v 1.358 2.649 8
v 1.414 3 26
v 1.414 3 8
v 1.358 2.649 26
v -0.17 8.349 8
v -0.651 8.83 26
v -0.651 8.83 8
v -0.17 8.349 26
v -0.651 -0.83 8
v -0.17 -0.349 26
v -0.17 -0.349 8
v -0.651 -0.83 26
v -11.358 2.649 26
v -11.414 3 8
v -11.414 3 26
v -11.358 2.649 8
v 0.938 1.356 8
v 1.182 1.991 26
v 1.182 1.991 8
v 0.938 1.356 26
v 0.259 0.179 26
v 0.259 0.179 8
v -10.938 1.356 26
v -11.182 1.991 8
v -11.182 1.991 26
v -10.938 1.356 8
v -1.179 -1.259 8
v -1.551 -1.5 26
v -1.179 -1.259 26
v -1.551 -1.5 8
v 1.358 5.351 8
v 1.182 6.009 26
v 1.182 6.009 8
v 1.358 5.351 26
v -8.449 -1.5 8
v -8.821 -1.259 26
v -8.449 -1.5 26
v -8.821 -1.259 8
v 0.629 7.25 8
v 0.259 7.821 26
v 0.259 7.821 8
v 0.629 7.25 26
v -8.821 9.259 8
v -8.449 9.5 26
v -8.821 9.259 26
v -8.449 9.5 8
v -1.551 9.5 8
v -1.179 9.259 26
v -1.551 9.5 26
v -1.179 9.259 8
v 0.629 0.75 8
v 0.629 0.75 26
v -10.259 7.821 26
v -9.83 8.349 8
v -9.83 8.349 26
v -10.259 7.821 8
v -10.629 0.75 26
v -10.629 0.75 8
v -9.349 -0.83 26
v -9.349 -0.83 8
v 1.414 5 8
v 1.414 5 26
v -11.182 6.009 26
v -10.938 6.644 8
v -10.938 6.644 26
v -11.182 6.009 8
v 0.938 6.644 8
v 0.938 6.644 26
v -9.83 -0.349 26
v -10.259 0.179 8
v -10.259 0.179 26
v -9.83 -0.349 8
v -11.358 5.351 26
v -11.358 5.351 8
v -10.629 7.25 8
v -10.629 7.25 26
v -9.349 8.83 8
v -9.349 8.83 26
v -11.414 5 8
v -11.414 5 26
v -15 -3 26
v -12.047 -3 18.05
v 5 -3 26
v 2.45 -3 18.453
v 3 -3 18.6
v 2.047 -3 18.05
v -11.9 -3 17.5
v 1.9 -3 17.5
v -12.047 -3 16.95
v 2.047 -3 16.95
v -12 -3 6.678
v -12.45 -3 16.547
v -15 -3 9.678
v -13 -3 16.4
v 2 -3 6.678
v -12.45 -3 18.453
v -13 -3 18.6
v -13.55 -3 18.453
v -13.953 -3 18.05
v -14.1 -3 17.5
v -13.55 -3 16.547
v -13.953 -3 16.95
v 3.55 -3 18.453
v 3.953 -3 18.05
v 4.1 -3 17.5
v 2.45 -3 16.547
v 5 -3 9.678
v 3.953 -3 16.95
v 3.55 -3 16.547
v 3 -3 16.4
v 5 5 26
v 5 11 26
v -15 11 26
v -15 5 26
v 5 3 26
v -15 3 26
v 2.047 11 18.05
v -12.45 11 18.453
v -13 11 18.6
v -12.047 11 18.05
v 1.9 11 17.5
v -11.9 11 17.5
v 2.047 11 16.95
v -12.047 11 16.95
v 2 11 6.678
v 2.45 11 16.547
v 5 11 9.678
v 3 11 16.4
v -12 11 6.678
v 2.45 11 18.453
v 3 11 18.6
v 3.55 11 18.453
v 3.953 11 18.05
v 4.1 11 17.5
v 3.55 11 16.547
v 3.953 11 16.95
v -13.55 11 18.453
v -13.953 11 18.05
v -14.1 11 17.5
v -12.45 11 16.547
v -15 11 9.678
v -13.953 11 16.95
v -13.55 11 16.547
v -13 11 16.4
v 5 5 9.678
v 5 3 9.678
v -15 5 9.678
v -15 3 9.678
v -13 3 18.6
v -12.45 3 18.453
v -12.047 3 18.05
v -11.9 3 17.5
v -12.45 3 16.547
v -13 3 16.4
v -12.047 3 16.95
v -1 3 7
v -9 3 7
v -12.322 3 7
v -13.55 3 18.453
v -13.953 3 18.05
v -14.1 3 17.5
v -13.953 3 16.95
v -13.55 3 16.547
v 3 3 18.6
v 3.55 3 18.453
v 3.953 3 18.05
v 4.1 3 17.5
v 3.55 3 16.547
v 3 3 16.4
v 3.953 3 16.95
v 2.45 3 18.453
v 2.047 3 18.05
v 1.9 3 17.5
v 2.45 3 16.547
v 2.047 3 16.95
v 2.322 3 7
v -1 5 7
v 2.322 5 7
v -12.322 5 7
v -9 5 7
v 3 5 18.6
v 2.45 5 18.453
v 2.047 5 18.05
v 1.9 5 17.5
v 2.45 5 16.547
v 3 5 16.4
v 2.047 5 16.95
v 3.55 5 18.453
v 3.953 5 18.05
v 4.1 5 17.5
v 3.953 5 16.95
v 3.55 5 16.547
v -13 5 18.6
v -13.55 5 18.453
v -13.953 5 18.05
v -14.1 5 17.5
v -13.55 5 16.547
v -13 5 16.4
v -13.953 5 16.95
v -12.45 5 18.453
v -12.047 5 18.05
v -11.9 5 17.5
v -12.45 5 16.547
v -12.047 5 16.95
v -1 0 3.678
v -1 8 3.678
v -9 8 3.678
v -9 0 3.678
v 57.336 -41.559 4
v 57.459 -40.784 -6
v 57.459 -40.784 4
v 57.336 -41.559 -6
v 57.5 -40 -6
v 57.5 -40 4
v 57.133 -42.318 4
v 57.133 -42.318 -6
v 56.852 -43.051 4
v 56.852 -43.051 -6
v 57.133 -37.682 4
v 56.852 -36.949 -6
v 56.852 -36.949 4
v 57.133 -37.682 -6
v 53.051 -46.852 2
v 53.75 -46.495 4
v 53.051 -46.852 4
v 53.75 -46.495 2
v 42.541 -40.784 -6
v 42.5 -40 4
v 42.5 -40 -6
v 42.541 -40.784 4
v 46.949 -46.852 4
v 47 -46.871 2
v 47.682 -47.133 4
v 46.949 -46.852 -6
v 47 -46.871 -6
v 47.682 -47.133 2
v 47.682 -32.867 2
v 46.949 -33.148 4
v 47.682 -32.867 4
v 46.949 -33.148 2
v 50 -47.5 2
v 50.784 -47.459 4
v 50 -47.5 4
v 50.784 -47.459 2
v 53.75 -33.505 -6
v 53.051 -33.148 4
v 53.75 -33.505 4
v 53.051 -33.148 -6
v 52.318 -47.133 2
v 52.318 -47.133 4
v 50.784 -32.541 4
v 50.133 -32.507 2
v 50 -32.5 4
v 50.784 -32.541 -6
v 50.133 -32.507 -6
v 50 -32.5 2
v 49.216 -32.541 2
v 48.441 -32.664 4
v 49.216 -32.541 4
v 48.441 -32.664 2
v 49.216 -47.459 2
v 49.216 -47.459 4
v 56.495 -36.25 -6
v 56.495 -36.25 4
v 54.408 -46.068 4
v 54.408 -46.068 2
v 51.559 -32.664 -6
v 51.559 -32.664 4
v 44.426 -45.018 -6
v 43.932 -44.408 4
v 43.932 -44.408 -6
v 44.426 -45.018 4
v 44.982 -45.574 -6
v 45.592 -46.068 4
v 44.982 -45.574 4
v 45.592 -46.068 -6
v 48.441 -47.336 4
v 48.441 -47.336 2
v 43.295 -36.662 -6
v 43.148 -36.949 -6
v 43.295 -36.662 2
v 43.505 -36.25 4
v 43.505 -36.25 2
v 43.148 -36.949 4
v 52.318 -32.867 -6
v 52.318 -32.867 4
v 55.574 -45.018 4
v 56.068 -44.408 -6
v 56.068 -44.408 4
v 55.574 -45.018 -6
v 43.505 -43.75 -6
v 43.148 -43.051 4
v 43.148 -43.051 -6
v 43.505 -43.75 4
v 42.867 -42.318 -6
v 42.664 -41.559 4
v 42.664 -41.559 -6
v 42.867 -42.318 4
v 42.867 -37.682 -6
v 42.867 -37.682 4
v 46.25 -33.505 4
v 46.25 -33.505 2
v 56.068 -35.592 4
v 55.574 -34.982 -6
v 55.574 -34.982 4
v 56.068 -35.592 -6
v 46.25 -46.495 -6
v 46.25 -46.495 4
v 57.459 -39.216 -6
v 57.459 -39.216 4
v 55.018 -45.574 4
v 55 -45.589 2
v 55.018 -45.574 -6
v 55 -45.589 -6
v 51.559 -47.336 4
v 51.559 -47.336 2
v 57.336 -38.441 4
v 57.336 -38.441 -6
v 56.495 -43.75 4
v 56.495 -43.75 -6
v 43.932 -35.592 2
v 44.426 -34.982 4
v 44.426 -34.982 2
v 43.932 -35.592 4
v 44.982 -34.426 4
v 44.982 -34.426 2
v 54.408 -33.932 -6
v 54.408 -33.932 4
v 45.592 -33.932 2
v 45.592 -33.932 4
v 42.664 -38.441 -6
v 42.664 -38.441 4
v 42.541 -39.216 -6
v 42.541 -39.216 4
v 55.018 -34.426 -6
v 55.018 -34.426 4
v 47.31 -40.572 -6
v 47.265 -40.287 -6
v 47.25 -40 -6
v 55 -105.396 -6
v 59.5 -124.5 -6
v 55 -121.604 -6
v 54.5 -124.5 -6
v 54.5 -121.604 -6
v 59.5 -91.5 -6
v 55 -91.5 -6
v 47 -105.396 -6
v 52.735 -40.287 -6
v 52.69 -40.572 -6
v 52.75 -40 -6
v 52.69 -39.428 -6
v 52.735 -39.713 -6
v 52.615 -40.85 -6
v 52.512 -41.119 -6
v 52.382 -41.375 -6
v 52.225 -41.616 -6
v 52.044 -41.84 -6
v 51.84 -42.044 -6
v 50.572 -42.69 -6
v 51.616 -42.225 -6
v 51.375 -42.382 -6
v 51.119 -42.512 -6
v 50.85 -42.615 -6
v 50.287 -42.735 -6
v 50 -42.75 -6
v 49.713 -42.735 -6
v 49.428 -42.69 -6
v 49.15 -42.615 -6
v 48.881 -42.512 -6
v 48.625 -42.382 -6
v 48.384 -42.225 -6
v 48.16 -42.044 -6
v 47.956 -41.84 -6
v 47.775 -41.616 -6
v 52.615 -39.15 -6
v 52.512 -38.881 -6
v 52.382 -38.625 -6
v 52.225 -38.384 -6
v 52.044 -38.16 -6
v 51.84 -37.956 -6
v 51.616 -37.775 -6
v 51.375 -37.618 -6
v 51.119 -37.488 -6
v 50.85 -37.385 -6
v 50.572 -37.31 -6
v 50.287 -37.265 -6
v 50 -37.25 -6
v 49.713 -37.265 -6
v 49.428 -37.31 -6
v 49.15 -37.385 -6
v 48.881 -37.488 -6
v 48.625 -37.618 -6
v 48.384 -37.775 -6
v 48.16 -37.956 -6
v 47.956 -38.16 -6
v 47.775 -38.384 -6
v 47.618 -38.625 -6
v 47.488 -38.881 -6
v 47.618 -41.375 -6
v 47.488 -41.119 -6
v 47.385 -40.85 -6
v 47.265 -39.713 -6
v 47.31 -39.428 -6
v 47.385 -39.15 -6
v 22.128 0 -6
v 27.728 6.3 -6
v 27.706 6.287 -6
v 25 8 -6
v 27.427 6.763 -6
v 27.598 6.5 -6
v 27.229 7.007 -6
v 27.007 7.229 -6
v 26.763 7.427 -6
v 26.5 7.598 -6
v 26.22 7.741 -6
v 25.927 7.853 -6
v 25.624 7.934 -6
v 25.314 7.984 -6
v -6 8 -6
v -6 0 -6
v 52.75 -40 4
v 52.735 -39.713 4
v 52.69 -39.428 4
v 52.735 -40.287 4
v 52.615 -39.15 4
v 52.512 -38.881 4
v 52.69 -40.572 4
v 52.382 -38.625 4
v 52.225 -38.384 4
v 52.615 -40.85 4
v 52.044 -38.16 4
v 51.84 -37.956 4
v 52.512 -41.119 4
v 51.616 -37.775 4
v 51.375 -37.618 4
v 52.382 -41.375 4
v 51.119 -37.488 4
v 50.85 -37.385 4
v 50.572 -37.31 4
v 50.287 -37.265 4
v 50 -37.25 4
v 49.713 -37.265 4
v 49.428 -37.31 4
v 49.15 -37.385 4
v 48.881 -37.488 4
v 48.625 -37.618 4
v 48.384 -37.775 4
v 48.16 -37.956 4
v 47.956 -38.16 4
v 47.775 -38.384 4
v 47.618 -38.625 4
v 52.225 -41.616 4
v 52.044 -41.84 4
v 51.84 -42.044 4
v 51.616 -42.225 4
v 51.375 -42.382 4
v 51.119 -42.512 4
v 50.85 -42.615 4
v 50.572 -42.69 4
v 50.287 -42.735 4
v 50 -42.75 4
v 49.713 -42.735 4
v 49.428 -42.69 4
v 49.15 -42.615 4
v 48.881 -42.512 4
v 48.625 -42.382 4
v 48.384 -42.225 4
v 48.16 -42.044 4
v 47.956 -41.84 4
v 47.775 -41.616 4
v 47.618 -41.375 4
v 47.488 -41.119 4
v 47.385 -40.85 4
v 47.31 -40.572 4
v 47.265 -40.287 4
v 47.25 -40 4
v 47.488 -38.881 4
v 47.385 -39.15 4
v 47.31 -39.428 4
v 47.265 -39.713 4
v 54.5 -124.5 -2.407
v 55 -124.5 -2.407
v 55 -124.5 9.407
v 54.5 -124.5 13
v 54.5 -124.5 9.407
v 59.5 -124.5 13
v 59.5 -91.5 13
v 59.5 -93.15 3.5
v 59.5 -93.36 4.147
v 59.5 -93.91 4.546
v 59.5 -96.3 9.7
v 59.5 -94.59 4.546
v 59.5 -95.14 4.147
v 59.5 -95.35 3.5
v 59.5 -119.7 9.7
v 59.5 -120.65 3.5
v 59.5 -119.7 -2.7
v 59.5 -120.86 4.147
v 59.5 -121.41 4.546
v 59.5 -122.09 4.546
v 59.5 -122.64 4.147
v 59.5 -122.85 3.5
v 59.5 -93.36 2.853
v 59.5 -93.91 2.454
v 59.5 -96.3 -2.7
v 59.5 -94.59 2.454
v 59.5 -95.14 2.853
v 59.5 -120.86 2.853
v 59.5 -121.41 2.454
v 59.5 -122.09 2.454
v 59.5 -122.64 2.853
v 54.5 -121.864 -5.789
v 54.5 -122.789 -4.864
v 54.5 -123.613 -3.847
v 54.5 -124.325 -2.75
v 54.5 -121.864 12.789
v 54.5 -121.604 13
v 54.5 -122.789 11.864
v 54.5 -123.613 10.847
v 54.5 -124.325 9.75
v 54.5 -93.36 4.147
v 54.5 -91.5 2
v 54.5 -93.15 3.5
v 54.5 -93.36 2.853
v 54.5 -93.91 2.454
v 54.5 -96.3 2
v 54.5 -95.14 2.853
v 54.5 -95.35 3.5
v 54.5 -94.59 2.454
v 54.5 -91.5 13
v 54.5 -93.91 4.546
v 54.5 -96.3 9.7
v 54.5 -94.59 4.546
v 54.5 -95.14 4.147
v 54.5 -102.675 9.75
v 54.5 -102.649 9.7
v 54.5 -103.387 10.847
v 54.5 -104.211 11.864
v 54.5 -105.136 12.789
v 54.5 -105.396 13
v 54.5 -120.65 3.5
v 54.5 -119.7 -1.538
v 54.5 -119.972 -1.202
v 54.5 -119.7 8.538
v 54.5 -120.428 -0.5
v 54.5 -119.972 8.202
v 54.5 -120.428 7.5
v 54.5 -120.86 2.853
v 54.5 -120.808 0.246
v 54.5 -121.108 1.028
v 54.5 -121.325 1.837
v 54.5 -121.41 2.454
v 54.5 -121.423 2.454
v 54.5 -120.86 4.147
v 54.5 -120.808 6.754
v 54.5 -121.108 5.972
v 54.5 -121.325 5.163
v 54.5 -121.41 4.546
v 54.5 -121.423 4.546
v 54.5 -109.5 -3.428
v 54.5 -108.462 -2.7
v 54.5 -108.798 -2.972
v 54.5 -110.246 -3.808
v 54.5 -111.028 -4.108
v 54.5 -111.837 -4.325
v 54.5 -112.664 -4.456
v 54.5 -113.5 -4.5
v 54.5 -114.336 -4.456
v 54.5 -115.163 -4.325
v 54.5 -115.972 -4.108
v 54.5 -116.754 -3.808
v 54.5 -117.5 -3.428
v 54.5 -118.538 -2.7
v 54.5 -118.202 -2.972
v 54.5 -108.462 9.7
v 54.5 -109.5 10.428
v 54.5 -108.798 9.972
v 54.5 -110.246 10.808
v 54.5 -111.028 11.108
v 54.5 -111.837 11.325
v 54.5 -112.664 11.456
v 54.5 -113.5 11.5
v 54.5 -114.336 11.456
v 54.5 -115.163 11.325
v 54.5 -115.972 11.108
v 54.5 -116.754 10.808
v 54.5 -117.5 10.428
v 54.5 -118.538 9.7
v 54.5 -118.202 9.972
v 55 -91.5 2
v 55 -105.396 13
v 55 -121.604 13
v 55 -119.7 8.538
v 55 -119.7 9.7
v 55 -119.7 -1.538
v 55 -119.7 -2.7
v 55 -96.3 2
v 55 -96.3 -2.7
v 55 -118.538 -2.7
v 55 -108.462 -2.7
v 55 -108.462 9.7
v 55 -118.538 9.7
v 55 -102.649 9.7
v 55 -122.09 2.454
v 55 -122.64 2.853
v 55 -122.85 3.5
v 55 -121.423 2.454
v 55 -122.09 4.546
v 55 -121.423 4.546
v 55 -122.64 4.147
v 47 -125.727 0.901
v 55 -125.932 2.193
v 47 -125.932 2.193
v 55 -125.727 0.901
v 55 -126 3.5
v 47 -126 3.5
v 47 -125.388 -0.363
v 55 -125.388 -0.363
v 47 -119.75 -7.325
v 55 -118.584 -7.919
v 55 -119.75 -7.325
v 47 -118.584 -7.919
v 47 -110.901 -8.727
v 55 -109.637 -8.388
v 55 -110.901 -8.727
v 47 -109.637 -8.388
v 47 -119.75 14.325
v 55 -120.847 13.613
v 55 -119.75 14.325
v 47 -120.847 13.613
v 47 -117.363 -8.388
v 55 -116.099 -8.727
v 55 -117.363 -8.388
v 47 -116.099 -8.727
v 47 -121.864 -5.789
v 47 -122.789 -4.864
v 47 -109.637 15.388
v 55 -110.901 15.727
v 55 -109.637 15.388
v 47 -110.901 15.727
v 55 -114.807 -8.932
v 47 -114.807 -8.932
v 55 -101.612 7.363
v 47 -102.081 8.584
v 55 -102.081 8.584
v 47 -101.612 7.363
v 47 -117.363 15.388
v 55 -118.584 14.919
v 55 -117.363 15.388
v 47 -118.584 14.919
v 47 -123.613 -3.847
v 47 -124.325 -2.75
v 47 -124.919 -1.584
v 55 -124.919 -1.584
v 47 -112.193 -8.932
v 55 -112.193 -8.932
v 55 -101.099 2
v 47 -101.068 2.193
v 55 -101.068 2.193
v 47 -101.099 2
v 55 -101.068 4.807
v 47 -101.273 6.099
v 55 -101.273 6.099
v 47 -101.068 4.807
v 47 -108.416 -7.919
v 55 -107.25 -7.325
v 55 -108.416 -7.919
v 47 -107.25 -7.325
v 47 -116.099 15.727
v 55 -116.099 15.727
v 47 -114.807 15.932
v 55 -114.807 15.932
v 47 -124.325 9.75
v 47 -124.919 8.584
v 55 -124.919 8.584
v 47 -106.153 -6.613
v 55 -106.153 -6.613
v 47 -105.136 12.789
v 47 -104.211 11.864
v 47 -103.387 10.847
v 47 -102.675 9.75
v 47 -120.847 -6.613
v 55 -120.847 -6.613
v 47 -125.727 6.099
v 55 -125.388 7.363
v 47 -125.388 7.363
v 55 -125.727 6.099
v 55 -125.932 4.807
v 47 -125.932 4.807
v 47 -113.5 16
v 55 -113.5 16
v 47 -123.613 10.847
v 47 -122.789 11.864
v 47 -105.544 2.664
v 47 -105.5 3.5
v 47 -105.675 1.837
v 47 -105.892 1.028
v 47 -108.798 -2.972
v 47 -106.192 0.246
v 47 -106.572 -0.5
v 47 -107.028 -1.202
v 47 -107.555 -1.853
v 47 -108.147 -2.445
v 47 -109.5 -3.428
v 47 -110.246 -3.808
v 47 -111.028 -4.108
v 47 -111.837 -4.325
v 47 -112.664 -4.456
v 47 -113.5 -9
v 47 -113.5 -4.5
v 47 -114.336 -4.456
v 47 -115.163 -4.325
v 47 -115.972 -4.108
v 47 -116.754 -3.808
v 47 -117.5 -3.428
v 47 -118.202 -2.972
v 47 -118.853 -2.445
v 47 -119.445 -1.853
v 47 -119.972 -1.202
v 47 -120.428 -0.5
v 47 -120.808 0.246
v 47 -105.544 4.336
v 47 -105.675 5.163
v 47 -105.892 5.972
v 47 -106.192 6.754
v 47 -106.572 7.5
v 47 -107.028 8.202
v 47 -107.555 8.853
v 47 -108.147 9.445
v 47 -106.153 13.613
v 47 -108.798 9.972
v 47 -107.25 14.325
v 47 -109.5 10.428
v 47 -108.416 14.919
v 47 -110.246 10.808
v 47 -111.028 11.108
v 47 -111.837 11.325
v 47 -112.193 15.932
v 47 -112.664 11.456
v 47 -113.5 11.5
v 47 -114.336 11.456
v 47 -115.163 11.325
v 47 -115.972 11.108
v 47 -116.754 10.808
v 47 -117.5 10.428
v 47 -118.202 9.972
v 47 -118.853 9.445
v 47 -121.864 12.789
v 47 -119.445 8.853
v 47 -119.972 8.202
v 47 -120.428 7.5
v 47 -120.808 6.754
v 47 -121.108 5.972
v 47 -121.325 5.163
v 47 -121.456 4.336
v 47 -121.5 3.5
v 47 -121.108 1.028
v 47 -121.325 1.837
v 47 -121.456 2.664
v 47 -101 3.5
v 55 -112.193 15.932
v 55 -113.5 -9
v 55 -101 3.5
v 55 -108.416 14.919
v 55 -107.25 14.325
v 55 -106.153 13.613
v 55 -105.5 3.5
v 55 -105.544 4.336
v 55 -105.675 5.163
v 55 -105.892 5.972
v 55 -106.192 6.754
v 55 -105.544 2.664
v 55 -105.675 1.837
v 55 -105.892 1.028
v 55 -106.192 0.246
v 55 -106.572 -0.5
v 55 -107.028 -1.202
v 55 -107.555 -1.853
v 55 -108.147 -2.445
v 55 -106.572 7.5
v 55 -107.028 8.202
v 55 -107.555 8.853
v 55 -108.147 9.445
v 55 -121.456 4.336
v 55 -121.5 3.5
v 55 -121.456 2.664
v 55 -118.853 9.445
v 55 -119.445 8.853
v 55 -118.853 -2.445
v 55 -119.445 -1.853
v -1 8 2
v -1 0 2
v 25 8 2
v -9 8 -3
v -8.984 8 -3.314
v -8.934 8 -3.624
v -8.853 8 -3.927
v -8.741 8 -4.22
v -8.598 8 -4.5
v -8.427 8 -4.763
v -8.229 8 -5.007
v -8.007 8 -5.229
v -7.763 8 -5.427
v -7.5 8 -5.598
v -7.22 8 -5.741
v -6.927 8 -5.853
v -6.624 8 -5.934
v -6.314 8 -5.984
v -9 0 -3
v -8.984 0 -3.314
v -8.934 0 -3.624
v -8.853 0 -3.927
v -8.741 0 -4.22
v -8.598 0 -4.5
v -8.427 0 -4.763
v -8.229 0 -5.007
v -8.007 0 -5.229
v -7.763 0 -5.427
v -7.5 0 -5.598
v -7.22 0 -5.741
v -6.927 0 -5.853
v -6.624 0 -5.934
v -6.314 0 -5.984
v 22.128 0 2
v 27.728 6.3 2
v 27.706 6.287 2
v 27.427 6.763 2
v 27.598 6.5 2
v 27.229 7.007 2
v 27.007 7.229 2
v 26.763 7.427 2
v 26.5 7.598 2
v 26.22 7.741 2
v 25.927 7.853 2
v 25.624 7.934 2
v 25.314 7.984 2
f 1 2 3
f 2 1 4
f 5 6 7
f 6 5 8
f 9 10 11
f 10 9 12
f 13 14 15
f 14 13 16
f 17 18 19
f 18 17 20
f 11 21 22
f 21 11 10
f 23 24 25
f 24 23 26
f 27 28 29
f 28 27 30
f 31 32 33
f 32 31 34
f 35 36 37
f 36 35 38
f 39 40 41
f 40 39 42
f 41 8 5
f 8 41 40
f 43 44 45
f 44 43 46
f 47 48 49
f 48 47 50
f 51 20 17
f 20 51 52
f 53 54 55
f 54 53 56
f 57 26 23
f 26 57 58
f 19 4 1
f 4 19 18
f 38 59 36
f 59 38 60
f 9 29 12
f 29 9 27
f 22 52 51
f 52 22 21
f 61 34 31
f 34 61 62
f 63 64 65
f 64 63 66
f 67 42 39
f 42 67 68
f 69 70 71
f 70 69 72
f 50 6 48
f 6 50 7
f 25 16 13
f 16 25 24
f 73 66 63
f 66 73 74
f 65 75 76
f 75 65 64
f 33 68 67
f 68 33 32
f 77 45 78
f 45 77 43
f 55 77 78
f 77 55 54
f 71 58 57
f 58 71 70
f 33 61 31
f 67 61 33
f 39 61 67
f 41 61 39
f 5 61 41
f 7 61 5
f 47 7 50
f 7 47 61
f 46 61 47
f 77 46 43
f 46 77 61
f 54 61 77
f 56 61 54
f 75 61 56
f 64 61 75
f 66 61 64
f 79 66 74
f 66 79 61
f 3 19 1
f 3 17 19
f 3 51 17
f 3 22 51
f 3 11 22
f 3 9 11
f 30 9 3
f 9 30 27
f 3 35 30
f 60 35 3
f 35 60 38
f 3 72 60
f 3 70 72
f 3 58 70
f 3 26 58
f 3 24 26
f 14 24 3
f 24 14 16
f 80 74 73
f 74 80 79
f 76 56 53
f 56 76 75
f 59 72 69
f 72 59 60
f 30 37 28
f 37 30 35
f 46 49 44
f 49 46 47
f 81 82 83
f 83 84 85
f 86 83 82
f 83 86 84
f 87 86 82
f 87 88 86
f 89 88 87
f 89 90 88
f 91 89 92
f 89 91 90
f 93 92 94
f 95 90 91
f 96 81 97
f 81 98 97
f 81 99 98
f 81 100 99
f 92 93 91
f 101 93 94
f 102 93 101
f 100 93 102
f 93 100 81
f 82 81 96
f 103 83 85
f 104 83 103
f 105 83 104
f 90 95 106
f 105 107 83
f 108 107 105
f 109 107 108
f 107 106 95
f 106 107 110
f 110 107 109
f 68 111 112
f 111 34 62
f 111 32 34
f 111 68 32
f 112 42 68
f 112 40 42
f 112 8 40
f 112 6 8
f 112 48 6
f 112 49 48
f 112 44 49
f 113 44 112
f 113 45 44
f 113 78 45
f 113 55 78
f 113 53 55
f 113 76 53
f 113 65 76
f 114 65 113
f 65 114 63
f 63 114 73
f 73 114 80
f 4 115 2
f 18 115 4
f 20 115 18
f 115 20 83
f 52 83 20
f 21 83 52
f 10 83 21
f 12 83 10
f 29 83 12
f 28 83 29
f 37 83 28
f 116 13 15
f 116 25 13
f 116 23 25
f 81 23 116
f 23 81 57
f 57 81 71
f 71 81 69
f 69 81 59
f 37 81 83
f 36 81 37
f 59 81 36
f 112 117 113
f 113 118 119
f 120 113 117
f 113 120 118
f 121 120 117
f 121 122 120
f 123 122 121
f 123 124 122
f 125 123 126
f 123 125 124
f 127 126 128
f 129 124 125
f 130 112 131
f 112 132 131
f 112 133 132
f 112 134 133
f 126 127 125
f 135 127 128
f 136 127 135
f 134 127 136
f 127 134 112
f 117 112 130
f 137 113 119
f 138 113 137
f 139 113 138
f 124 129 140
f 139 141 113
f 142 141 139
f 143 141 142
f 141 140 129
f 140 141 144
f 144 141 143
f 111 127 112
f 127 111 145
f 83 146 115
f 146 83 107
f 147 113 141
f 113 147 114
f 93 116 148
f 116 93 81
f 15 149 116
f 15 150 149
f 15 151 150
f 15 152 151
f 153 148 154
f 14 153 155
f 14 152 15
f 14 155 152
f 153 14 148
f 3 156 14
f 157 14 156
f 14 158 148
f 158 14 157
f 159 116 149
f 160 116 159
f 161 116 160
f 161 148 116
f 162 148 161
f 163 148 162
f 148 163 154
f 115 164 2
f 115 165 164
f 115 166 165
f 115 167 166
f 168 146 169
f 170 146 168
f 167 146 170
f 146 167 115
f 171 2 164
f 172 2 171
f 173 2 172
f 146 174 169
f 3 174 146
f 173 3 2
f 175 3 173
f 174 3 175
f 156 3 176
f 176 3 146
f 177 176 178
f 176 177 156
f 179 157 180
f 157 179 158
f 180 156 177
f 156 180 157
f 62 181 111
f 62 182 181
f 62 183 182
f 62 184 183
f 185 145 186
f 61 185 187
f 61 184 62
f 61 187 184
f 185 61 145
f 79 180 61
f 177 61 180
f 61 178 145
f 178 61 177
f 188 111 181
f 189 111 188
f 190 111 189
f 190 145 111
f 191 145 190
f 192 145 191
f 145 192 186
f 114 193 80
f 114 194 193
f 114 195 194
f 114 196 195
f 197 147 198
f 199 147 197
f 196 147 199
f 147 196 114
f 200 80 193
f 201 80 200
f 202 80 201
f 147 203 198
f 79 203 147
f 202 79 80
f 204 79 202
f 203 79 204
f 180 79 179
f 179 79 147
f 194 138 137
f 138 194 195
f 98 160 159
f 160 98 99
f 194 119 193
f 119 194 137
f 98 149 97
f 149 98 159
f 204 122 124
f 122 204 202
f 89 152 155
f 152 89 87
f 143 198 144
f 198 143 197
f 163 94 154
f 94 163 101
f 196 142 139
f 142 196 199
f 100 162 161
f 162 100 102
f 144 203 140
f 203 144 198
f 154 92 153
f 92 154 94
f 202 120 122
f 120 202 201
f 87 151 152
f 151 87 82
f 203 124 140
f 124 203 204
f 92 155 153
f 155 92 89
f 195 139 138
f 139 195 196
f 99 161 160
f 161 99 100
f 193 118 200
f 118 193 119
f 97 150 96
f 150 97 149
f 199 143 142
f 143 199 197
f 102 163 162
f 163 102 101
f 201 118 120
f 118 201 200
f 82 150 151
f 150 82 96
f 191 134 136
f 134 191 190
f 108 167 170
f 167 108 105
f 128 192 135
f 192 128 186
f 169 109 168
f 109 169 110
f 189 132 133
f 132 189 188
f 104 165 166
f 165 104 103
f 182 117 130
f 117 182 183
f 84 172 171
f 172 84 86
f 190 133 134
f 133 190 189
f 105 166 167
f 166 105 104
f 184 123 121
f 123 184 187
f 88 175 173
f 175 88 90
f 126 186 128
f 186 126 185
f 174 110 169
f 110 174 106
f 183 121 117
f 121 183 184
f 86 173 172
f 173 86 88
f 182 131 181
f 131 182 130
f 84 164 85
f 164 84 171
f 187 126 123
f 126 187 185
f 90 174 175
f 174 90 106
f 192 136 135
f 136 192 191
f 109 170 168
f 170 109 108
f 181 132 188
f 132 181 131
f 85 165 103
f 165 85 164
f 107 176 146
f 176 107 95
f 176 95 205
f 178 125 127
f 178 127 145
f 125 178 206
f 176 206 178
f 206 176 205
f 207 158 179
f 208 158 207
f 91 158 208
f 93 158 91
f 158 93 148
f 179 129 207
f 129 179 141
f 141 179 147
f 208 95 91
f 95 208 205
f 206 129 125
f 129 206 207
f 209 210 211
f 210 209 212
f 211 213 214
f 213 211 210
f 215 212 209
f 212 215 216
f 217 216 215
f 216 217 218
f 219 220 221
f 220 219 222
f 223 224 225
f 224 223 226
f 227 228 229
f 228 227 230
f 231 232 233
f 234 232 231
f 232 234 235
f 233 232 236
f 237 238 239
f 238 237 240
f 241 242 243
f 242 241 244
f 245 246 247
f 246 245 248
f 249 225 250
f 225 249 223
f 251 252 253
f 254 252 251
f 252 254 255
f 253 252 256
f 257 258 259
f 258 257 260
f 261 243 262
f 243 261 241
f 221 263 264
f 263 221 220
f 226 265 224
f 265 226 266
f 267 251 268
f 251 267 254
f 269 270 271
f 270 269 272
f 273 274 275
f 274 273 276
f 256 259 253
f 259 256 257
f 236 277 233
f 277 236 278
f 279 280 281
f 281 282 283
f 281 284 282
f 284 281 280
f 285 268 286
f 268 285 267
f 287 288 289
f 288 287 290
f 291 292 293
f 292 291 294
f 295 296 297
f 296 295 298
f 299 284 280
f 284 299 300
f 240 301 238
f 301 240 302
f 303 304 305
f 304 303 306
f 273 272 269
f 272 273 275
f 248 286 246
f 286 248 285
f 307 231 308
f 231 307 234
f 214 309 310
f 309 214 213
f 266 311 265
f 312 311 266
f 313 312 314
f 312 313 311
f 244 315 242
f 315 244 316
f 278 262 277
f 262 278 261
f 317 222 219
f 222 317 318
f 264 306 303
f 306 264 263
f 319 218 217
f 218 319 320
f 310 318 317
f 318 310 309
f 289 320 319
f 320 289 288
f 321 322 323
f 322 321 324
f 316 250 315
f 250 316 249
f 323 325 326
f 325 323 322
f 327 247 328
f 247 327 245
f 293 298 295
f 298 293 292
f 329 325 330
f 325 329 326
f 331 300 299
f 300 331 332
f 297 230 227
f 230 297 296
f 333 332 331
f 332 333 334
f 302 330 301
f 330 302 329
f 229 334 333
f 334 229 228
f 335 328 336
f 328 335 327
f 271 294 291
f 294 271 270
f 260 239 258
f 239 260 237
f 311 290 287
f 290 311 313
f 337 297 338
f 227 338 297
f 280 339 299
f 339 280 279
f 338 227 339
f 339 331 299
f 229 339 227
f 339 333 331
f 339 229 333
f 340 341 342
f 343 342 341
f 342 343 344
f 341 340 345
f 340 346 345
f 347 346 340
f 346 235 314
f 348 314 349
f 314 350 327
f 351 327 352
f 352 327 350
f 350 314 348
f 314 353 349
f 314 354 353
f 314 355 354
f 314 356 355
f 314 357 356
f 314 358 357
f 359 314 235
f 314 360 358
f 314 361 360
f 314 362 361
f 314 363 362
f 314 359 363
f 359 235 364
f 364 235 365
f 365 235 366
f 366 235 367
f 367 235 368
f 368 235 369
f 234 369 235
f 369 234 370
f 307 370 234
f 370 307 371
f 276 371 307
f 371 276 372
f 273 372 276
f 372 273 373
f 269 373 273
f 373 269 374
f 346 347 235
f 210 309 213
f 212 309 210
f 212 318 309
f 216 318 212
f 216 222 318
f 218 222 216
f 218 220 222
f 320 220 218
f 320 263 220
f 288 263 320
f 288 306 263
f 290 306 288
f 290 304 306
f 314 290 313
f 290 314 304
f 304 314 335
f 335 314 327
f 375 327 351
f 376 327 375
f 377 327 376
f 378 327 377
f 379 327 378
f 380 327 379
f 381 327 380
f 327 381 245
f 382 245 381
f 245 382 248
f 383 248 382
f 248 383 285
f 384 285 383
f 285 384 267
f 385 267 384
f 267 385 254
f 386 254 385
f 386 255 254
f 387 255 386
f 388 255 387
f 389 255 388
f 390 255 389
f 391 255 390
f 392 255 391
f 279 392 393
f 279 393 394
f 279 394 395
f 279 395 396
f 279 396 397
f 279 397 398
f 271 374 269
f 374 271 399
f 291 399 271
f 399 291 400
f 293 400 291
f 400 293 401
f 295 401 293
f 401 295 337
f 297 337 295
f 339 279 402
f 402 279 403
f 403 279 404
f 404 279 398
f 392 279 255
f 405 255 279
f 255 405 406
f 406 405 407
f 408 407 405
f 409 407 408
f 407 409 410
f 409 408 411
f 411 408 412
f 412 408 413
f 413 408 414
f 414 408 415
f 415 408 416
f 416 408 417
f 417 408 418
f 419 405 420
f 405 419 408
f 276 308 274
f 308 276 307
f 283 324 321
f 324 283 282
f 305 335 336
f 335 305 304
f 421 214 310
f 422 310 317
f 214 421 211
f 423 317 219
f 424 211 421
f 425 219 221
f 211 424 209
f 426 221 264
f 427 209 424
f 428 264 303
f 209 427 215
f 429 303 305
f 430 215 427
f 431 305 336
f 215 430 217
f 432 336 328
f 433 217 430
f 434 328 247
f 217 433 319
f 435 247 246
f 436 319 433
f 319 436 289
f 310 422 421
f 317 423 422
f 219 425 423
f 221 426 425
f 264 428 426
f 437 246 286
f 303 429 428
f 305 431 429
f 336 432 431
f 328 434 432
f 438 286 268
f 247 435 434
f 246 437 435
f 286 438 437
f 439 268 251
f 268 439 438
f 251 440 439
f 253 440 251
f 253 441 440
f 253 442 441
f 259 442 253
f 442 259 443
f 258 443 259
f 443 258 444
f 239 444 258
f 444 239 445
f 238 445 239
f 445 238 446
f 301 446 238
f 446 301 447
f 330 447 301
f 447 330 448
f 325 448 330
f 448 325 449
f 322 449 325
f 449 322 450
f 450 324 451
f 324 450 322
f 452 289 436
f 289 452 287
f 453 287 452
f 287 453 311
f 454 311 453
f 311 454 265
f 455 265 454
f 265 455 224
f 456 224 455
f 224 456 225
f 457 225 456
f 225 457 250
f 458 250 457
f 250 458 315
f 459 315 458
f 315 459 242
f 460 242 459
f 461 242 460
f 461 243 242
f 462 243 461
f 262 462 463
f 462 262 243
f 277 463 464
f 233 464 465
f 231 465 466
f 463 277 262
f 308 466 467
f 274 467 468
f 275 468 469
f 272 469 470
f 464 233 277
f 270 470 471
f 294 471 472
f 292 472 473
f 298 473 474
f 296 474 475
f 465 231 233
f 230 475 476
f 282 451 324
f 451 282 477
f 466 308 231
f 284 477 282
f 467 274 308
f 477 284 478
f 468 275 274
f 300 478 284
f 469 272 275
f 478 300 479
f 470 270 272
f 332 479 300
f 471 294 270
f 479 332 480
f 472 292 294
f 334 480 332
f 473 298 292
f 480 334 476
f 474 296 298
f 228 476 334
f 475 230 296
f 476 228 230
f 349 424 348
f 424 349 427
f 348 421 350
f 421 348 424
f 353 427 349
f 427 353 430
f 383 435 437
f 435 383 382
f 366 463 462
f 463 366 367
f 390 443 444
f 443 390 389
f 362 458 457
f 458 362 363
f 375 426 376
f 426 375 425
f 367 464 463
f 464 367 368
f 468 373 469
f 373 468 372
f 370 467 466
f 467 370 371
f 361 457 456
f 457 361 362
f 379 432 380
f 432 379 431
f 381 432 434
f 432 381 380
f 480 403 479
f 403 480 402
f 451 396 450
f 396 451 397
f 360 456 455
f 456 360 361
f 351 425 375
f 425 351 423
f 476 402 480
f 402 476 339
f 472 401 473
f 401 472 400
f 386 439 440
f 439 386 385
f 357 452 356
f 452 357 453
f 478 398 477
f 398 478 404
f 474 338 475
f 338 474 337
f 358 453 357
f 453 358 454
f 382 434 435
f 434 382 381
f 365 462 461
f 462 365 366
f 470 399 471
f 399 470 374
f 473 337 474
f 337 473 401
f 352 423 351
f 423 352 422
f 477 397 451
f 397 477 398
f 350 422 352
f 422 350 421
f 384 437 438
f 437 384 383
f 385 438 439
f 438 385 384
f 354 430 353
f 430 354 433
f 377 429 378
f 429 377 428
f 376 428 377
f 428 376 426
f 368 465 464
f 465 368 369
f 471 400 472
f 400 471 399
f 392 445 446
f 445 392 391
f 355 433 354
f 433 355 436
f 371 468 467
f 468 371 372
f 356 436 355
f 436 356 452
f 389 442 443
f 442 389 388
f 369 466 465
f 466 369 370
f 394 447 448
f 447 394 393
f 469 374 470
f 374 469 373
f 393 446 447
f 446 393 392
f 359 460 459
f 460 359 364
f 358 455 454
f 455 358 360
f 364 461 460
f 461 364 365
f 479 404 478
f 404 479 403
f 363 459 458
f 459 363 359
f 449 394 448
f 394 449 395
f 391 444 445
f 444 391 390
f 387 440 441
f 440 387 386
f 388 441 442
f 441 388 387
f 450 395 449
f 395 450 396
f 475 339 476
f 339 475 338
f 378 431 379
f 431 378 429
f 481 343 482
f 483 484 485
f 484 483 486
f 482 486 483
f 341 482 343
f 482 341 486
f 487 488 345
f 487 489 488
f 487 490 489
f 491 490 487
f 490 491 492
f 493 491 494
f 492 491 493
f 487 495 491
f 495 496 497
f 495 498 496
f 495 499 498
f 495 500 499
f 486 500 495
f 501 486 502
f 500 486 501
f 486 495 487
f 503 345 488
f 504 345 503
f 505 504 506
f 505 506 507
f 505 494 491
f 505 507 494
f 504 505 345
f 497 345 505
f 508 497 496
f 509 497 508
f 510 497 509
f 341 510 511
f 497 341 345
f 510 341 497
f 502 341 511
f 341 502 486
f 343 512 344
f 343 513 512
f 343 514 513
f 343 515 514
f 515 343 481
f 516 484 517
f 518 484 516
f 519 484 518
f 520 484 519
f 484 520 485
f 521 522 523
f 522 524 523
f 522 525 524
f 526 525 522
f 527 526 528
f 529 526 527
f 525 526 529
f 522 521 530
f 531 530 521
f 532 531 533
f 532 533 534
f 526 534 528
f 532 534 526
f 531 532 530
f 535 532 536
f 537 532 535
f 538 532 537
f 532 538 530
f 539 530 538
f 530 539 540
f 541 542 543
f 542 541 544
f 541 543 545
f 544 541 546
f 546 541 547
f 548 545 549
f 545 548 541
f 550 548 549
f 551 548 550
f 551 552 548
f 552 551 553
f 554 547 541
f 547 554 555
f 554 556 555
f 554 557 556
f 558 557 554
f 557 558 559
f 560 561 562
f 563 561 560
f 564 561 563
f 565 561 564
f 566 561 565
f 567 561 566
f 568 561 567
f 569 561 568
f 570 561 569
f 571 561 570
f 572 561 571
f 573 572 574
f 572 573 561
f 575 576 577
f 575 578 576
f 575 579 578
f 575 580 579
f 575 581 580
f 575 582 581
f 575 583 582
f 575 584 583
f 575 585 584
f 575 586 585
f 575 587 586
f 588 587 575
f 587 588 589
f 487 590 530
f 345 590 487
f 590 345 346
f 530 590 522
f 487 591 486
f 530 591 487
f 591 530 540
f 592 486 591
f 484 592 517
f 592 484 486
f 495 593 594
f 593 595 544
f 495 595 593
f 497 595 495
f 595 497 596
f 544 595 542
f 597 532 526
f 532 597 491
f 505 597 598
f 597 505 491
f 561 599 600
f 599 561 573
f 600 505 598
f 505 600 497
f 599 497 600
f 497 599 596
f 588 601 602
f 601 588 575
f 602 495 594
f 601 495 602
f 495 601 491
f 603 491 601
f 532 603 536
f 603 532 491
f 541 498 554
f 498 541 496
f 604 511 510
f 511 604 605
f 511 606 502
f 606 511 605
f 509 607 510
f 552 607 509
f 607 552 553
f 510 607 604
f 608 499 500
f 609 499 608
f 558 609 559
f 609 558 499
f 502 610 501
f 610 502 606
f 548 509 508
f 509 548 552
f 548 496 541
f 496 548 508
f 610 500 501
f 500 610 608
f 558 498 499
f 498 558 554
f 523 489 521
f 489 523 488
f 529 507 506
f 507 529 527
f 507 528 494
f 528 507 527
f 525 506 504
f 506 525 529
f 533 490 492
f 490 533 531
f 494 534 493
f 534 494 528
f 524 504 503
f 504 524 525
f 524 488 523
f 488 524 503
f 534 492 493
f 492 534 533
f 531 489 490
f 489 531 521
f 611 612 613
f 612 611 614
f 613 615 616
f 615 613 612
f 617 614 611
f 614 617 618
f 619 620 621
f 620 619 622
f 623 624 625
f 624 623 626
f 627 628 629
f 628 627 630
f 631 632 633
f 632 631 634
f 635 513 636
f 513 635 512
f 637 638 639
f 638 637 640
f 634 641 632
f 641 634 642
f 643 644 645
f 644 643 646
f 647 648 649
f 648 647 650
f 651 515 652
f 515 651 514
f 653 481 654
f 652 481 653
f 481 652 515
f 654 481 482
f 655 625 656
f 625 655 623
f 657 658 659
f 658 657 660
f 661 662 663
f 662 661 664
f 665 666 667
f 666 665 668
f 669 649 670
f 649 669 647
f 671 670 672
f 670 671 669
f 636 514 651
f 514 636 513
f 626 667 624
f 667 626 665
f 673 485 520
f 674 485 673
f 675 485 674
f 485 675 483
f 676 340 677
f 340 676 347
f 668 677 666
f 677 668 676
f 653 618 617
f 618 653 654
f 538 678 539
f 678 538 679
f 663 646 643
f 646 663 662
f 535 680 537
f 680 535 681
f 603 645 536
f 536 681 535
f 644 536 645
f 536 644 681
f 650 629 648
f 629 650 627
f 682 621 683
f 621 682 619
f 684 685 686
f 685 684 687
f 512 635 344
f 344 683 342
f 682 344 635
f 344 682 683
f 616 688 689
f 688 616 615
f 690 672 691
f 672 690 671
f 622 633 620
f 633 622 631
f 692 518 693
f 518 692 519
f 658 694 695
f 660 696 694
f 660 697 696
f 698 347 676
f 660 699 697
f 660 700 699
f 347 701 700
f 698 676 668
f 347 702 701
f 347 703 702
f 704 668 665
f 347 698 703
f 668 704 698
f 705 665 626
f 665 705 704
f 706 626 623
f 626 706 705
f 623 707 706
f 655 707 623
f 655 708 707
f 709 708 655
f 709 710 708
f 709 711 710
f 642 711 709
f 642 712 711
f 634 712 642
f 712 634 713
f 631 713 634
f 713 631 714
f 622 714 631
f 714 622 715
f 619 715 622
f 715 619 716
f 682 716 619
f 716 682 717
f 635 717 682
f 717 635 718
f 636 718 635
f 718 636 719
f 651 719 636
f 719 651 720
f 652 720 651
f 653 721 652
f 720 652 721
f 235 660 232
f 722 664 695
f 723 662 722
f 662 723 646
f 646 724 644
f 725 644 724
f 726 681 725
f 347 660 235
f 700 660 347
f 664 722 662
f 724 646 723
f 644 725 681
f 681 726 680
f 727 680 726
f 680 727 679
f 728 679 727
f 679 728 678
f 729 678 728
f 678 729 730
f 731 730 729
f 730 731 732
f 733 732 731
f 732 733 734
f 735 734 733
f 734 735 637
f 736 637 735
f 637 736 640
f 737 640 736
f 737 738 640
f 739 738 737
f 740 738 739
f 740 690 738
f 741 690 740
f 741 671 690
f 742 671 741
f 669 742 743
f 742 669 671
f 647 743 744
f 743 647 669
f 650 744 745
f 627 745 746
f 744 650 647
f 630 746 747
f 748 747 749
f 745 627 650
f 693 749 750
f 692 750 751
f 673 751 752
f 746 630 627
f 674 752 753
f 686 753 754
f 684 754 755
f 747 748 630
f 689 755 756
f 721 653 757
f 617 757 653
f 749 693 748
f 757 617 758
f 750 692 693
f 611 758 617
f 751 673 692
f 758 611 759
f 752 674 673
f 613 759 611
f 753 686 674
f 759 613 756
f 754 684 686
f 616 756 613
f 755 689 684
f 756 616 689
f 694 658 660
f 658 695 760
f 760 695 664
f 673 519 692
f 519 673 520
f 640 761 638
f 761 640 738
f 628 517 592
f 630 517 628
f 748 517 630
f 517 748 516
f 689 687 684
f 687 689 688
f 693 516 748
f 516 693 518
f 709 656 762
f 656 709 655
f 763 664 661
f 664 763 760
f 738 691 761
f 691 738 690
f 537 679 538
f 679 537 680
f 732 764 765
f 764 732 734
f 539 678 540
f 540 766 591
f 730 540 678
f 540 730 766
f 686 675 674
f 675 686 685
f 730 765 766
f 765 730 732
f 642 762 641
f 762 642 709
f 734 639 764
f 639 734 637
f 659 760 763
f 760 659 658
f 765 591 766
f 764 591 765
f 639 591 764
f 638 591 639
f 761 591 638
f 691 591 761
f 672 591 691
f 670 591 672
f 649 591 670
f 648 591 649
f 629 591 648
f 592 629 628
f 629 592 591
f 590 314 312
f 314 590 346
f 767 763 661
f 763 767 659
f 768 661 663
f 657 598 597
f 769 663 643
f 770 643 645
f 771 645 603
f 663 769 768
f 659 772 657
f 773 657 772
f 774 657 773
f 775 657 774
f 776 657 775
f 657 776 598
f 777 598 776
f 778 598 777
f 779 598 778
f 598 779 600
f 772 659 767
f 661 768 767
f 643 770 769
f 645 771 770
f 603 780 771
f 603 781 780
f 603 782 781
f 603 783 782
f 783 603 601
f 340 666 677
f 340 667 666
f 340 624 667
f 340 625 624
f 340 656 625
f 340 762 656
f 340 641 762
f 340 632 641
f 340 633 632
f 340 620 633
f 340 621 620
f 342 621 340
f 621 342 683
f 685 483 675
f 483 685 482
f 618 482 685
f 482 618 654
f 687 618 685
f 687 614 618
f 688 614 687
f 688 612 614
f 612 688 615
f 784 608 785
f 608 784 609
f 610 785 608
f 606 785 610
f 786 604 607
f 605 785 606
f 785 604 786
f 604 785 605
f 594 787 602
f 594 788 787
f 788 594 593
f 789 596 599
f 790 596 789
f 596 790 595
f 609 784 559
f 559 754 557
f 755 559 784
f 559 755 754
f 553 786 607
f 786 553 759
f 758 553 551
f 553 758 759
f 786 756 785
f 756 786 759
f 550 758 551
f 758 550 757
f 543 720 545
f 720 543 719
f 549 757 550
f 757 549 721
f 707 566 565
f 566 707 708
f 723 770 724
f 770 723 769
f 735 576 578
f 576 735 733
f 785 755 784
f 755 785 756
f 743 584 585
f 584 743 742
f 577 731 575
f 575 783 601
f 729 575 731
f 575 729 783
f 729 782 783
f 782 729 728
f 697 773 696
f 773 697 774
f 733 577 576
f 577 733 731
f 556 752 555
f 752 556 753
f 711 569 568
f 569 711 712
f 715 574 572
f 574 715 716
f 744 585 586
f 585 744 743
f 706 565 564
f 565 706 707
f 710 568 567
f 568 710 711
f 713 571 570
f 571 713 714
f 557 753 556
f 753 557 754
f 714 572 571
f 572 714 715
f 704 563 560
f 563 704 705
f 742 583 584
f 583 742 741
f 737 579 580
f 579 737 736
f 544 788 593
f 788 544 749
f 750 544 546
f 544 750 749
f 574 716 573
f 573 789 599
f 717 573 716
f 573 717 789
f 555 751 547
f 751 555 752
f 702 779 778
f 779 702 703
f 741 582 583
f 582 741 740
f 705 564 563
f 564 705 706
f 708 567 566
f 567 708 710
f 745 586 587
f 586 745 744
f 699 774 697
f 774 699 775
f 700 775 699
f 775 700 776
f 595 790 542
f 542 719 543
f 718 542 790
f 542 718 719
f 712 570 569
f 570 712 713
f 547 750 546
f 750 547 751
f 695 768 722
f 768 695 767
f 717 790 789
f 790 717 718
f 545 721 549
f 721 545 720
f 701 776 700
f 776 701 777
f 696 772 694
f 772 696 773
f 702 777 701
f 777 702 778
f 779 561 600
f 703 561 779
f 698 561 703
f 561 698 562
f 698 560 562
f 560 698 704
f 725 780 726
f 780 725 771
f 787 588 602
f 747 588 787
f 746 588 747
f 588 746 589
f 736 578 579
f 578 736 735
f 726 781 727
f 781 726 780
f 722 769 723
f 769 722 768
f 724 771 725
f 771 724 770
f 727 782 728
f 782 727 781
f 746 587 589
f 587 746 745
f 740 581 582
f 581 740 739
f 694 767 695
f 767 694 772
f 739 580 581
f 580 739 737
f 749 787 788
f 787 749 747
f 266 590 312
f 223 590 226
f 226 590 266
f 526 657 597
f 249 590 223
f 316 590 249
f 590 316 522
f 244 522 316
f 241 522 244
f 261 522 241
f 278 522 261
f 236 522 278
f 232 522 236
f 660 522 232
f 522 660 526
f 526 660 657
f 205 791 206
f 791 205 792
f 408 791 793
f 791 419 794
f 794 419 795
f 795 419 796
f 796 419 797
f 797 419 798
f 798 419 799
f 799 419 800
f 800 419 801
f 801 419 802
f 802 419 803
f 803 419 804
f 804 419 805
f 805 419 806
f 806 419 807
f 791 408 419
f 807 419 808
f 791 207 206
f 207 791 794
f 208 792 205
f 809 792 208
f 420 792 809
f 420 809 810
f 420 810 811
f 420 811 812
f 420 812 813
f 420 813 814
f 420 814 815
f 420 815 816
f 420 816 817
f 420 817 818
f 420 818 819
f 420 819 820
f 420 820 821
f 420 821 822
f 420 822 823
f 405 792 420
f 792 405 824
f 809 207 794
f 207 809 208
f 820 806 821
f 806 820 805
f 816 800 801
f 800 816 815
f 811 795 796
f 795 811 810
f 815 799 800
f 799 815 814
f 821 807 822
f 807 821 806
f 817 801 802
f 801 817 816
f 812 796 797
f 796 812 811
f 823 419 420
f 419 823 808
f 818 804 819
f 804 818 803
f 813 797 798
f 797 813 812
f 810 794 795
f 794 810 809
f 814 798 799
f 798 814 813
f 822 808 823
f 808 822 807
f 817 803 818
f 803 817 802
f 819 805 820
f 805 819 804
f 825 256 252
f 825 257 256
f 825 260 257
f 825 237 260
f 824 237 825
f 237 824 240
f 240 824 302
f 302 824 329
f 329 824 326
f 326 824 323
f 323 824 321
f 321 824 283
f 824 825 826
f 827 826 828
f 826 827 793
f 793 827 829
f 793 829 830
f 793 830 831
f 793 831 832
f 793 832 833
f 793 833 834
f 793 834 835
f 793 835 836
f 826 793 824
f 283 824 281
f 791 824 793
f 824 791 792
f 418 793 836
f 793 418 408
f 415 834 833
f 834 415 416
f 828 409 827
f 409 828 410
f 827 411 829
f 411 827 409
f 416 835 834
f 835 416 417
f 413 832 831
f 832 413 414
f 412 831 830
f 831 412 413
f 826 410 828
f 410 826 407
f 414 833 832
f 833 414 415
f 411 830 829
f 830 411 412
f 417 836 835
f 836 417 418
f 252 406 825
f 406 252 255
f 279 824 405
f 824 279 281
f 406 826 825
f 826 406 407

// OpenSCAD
rotate([-90,0,0])
{
rotate([90,90,0])translate([-4,-5,3])clamp();

$fn=60;

translate([-9,-7,0])cube([8,10,8]);
translate([-6,3,0])rotate([0,0,-90])
cylinder(d=6,h=8);
translate([-6,-2,0])cube([31,8,8]);
translate([25,6,5])rotate([90,0,0])
cylinder(d=6,h=8);
translate([20.8,-2,2.3])rotate([0,60,0])
cube([47,8,8]);
difference(){
translate([50,-4,-40])rotate([-90,0,0])
cylinder(d=15,h=10);
translate([50,-5,-40])rotate([-90,0,0])
cylinder(d=5.5,h=12);
}
translate([47,0,-45])
rotate([0,90,0])
{
    translate([0,-2,0])cube([60.5,8,8]);
    translate([63,-3.5,0])rotate([0,0,0])
    servo_bracket();
}
}

module clamp(){
difference(){
translate([-7,-10,0])
cube([14,20,23]);
difference(){
    translate([0,0,5])cylinder(d=13,h=25,$fn=60);
    translate([6.5,0,12])cube([2,12,25],center=true);
    translate([-6.5,0,12])cube([2,12,25],center=true);
}
translate([-1,-11,4])cube([2,22,25]);
translate([-9,-8,14.5])rotate([0,90,0])
cylinder(d=2.2,h=21,$fn=12);
translate([-9,8,14.5])rotate([0,90,0])
cylinder(d=2.2,h=21,$fn=12);
translate([0,21,0])rotate([45,0,0])cube(size=[25,25,25],center=true);
translate([0,-21,0])rotate([45,0,0])cube(size=[25,25,25],center=true);
translate([21,0,0])rotate([0,0,90])rotate([45,0,0])
cube(size=[25,25,25],center=true);
translate([-21,0,0])rotate([0,0,90])rotate([45,0,0])
cube(size=[25,25,25],center=true);
}
}

module servo_bracket(){
difference(){
translate([0,0,10])cube([33,19,5],center=true);
cube([23.4,12.4,50],center=true);
translate([13.75,0,-1])cylinder(d=2.2,h=50,$fn=10);
translate([-13.75,0,-1])cylinder(d=2.2,h=50,$fn=10);
}
translate([5.5,0,0])
difference(){
cylinder(d=25,h=8);
cylinder(d=16,h=8);
}
}
